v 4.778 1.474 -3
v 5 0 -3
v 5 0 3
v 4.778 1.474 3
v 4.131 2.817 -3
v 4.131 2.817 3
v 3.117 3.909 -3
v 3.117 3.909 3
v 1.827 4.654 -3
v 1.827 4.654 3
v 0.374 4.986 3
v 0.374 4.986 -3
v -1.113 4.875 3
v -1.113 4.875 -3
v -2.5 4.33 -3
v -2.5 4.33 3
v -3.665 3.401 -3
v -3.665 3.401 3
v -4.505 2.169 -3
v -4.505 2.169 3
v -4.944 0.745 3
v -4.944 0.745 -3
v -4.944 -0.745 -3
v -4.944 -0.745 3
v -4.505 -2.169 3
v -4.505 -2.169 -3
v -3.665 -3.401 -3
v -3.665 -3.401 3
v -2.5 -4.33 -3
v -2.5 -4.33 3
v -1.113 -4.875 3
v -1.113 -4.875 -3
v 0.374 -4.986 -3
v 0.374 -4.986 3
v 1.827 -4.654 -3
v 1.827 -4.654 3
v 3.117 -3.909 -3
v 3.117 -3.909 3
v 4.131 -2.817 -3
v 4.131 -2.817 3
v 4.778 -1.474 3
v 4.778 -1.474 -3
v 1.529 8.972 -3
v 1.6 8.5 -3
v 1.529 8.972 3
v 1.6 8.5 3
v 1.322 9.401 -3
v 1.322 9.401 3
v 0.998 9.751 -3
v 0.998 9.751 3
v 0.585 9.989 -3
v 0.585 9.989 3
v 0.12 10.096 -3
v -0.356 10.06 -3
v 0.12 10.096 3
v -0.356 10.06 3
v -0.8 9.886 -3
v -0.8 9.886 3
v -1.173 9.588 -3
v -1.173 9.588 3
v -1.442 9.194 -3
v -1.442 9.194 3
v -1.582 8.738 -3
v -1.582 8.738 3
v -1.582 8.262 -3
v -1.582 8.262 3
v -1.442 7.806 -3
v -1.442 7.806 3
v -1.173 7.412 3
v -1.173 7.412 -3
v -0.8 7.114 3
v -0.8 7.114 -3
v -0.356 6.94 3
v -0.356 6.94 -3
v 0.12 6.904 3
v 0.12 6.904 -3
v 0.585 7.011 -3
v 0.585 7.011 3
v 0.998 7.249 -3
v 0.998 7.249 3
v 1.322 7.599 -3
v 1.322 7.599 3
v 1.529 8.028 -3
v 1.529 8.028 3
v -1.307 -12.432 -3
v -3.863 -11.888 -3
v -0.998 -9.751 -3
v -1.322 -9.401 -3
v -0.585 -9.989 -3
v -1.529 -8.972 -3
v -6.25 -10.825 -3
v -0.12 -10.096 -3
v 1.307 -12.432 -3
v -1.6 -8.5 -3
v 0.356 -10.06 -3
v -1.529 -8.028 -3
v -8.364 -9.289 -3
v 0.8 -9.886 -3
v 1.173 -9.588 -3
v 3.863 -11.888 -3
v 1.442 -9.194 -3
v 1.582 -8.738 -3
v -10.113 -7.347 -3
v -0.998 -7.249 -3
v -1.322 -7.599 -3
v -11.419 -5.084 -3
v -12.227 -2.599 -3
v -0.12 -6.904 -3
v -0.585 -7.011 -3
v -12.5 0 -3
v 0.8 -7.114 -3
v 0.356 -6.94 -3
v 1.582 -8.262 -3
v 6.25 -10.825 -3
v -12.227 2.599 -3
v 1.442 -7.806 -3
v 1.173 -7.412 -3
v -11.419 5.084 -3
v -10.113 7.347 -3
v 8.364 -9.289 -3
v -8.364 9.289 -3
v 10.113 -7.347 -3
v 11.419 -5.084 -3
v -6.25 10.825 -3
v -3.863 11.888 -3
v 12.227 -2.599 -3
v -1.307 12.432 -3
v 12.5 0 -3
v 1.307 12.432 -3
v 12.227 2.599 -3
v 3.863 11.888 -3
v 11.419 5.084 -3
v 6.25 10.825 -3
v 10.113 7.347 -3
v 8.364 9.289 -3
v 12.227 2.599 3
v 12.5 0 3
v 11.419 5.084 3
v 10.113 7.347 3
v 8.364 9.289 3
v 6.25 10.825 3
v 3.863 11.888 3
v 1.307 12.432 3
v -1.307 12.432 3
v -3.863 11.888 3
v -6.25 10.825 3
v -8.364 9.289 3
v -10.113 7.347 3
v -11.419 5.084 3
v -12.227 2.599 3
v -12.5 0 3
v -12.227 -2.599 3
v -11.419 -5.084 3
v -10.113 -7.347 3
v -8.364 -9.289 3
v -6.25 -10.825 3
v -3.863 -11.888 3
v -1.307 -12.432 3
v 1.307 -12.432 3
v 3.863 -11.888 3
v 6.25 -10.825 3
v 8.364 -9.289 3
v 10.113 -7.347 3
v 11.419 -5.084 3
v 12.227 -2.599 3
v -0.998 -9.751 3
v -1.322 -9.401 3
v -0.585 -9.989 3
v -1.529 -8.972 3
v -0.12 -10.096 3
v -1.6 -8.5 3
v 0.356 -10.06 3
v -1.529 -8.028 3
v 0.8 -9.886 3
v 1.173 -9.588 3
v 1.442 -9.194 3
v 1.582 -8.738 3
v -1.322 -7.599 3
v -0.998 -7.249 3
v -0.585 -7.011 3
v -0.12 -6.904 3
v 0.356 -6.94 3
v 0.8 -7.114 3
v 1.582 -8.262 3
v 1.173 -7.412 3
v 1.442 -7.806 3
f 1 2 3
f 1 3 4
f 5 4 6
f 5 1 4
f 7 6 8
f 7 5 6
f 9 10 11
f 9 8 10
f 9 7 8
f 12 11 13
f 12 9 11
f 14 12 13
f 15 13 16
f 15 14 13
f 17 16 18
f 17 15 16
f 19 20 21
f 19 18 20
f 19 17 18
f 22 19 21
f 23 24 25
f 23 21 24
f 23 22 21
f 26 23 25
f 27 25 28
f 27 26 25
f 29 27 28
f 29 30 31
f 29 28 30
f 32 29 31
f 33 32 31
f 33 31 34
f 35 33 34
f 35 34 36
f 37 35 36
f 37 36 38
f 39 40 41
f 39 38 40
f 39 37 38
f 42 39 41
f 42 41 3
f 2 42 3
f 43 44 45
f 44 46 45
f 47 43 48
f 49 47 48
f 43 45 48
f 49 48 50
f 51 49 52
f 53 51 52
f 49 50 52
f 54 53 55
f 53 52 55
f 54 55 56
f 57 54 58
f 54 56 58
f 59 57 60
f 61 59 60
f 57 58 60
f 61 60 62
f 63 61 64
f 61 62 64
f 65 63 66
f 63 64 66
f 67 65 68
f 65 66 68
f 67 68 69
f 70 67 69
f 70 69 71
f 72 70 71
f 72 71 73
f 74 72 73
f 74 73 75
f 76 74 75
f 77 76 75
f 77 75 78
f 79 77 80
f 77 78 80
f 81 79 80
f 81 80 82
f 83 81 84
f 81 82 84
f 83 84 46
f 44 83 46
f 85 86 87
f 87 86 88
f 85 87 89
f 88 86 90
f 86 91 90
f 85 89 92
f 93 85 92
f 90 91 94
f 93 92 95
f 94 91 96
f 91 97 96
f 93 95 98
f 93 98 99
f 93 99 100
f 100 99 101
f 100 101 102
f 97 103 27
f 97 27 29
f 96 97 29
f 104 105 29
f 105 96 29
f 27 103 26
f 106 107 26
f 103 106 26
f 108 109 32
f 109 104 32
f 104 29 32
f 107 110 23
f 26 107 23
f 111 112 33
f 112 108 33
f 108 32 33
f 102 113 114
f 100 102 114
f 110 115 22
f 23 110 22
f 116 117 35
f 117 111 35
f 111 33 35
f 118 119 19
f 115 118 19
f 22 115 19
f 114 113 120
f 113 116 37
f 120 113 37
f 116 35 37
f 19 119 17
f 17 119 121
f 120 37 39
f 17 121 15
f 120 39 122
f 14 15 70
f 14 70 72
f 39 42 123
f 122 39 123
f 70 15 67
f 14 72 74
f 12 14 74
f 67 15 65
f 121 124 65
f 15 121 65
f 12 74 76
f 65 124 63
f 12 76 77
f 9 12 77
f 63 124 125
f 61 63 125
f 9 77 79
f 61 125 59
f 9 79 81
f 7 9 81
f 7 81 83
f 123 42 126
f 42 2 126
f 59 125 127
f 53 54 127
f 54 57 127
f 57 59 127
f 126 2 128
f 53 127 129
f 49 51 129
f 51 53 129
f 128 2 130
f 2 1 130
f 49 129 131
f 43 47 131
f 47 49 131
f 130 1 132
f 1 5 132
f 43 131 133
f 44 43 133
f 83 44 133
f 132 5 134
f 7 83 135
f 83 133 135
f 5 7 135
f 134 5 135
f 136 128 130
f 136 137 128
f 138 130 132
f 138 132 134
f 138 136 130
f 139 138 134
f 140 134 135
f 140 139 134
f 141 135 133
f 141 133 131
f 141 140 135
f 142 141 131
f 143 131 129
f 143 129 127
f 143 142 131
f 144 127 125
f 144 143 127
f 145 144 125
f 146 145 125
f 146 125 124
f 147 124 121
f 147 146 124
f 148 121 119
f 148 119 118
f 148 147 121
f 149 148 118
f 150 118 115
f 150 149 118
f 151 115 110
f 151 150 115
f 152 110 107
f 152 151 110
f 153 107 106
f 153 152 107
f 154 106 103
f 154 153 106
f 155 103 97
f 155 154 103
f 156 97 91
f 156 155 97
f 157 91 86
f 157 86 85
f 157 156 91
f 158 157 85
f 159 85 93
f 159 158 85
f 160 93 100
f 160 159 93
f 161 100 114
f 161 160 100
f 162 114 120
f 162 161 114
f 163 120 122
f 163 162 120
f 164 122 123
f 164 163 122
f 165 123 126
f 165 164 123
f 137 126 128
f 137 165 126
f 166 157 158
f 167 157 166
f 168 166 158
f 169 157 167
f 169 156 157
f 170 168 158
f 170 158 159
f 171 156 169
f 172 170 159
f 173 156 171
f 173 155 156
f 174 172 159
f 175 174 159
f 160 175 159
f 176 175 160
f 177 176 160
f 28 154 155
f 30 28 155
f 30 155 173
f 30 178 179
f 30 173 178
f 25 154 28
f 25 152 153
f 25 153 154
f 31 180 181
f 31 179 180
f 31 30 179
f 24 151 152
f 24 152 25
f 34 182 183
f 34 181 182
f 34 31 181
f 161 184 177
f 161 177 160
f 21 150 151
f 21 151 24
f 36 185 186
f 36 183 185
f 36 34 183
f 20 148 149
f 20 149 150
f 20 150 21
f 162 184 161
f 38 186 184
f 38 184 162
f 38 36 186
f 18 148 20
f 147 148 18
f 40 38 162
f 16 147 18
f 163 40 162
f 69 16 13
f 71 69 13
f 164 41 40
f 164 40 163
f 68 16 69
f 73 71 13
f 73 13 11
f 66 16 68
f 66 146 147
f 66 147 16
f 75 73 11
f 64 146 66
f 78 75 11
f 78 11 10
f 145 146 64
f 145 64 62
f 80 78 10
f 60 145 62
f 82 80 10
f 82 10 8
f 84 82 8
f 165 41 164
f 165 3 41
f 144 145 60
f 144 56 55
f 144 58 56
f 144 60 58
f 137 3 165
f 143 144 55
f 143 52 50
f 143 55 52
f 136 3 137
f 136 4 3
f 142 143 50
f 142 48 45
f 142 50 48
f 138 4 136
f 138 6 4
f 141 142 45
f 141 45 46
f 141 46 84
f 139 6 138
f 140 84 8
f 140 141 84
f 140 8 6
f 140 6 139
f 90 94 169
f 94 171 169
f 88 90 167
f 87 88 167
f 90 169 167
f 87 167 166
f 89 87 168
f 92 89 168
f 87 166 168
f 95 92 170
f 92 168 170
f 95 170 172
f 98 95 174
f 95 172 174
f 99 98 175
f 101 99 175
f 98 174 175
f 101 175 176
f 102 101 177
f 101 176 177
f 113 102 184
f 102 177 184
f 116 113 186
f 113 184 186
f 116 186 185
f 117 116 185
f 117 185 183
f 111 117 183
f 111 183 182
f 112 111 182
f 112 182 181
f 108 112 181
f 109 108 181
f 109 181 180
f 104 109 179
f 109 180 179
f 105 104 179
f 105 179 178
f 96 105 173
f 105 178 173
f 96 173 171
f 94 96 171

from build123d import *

# Parameters (mm, degrees)
SKETCH_1_R               = 12.5
EXTRUDE_1_DEPTH          = 3
CUT_EXTRUDE_1_DEPTH      = 18.930421077
CUT_EXTRUDE_1_DEPTH_BACK = 18.930421077
SKETCH_2_R               = 5
SKETCH_3_R               = 1.6
CUT_EXTRUDE_2_DEPTH      = 19.668154703
PATTERN_CIRCULAR_1_COUNT = 2


with BuildPart() as part:
    # ｽｹｯﾁ1 → ﾎﾞｽ - 押し出し1 (new, symmetric)
    with BuildSketch(Plane.XY):
        Circle(SKETCH_1_R)
    extrude(amount=EXTRUDE_1_DEPTH, both=True)

    # ｽｹｯﾁ2 → ｶｯﾄ - 押し出し1 (cut, two sides: drawn at the far end of the back side and taken through both)
    with BuildSketch(Plane.XY.offset(-CUT_EXTRUDE_1_DEPTH_BACK)):
        Circle(SKETCH_2_R)
    extrude(amount=CUT_EXTRUDE_1_DEPTH + CUT_EXTRUDE_1_DEPTH_BACK, mode=Mode.SUBTRACT)

    # ｽｹｯﾁ3 → ｶｯﾄ - 押し出し2 (cut, symmetric)
    with BuildSketch(Plane.XY.offset(3)):
        with Locations((0, 8.5)):
            Circle(SKETCH_3_R)
    cut_extrude_2 = extrude(amount=CUT_EXTRUDE_2_DEPTH, both=True, mode=Mode.SUBTRACT)

    # 円形ﾊﾟﾀｰﾝ1: ｶｯﾄ - 押し出し2 ×2 about axis
    pattern_circular_1_axis = Axis((0, 0, 0), (0, 0, 1))
    for i in range(1, PATTERN_CIRCULAR_1_COUNT):
        add(cut_extrude_2.rotate(pattern_circular_1_axis, i * 360 / PATTERN_CIRCULAR_1_COUNT), mode=Mode.SUBTRACT)


solid = part.part
